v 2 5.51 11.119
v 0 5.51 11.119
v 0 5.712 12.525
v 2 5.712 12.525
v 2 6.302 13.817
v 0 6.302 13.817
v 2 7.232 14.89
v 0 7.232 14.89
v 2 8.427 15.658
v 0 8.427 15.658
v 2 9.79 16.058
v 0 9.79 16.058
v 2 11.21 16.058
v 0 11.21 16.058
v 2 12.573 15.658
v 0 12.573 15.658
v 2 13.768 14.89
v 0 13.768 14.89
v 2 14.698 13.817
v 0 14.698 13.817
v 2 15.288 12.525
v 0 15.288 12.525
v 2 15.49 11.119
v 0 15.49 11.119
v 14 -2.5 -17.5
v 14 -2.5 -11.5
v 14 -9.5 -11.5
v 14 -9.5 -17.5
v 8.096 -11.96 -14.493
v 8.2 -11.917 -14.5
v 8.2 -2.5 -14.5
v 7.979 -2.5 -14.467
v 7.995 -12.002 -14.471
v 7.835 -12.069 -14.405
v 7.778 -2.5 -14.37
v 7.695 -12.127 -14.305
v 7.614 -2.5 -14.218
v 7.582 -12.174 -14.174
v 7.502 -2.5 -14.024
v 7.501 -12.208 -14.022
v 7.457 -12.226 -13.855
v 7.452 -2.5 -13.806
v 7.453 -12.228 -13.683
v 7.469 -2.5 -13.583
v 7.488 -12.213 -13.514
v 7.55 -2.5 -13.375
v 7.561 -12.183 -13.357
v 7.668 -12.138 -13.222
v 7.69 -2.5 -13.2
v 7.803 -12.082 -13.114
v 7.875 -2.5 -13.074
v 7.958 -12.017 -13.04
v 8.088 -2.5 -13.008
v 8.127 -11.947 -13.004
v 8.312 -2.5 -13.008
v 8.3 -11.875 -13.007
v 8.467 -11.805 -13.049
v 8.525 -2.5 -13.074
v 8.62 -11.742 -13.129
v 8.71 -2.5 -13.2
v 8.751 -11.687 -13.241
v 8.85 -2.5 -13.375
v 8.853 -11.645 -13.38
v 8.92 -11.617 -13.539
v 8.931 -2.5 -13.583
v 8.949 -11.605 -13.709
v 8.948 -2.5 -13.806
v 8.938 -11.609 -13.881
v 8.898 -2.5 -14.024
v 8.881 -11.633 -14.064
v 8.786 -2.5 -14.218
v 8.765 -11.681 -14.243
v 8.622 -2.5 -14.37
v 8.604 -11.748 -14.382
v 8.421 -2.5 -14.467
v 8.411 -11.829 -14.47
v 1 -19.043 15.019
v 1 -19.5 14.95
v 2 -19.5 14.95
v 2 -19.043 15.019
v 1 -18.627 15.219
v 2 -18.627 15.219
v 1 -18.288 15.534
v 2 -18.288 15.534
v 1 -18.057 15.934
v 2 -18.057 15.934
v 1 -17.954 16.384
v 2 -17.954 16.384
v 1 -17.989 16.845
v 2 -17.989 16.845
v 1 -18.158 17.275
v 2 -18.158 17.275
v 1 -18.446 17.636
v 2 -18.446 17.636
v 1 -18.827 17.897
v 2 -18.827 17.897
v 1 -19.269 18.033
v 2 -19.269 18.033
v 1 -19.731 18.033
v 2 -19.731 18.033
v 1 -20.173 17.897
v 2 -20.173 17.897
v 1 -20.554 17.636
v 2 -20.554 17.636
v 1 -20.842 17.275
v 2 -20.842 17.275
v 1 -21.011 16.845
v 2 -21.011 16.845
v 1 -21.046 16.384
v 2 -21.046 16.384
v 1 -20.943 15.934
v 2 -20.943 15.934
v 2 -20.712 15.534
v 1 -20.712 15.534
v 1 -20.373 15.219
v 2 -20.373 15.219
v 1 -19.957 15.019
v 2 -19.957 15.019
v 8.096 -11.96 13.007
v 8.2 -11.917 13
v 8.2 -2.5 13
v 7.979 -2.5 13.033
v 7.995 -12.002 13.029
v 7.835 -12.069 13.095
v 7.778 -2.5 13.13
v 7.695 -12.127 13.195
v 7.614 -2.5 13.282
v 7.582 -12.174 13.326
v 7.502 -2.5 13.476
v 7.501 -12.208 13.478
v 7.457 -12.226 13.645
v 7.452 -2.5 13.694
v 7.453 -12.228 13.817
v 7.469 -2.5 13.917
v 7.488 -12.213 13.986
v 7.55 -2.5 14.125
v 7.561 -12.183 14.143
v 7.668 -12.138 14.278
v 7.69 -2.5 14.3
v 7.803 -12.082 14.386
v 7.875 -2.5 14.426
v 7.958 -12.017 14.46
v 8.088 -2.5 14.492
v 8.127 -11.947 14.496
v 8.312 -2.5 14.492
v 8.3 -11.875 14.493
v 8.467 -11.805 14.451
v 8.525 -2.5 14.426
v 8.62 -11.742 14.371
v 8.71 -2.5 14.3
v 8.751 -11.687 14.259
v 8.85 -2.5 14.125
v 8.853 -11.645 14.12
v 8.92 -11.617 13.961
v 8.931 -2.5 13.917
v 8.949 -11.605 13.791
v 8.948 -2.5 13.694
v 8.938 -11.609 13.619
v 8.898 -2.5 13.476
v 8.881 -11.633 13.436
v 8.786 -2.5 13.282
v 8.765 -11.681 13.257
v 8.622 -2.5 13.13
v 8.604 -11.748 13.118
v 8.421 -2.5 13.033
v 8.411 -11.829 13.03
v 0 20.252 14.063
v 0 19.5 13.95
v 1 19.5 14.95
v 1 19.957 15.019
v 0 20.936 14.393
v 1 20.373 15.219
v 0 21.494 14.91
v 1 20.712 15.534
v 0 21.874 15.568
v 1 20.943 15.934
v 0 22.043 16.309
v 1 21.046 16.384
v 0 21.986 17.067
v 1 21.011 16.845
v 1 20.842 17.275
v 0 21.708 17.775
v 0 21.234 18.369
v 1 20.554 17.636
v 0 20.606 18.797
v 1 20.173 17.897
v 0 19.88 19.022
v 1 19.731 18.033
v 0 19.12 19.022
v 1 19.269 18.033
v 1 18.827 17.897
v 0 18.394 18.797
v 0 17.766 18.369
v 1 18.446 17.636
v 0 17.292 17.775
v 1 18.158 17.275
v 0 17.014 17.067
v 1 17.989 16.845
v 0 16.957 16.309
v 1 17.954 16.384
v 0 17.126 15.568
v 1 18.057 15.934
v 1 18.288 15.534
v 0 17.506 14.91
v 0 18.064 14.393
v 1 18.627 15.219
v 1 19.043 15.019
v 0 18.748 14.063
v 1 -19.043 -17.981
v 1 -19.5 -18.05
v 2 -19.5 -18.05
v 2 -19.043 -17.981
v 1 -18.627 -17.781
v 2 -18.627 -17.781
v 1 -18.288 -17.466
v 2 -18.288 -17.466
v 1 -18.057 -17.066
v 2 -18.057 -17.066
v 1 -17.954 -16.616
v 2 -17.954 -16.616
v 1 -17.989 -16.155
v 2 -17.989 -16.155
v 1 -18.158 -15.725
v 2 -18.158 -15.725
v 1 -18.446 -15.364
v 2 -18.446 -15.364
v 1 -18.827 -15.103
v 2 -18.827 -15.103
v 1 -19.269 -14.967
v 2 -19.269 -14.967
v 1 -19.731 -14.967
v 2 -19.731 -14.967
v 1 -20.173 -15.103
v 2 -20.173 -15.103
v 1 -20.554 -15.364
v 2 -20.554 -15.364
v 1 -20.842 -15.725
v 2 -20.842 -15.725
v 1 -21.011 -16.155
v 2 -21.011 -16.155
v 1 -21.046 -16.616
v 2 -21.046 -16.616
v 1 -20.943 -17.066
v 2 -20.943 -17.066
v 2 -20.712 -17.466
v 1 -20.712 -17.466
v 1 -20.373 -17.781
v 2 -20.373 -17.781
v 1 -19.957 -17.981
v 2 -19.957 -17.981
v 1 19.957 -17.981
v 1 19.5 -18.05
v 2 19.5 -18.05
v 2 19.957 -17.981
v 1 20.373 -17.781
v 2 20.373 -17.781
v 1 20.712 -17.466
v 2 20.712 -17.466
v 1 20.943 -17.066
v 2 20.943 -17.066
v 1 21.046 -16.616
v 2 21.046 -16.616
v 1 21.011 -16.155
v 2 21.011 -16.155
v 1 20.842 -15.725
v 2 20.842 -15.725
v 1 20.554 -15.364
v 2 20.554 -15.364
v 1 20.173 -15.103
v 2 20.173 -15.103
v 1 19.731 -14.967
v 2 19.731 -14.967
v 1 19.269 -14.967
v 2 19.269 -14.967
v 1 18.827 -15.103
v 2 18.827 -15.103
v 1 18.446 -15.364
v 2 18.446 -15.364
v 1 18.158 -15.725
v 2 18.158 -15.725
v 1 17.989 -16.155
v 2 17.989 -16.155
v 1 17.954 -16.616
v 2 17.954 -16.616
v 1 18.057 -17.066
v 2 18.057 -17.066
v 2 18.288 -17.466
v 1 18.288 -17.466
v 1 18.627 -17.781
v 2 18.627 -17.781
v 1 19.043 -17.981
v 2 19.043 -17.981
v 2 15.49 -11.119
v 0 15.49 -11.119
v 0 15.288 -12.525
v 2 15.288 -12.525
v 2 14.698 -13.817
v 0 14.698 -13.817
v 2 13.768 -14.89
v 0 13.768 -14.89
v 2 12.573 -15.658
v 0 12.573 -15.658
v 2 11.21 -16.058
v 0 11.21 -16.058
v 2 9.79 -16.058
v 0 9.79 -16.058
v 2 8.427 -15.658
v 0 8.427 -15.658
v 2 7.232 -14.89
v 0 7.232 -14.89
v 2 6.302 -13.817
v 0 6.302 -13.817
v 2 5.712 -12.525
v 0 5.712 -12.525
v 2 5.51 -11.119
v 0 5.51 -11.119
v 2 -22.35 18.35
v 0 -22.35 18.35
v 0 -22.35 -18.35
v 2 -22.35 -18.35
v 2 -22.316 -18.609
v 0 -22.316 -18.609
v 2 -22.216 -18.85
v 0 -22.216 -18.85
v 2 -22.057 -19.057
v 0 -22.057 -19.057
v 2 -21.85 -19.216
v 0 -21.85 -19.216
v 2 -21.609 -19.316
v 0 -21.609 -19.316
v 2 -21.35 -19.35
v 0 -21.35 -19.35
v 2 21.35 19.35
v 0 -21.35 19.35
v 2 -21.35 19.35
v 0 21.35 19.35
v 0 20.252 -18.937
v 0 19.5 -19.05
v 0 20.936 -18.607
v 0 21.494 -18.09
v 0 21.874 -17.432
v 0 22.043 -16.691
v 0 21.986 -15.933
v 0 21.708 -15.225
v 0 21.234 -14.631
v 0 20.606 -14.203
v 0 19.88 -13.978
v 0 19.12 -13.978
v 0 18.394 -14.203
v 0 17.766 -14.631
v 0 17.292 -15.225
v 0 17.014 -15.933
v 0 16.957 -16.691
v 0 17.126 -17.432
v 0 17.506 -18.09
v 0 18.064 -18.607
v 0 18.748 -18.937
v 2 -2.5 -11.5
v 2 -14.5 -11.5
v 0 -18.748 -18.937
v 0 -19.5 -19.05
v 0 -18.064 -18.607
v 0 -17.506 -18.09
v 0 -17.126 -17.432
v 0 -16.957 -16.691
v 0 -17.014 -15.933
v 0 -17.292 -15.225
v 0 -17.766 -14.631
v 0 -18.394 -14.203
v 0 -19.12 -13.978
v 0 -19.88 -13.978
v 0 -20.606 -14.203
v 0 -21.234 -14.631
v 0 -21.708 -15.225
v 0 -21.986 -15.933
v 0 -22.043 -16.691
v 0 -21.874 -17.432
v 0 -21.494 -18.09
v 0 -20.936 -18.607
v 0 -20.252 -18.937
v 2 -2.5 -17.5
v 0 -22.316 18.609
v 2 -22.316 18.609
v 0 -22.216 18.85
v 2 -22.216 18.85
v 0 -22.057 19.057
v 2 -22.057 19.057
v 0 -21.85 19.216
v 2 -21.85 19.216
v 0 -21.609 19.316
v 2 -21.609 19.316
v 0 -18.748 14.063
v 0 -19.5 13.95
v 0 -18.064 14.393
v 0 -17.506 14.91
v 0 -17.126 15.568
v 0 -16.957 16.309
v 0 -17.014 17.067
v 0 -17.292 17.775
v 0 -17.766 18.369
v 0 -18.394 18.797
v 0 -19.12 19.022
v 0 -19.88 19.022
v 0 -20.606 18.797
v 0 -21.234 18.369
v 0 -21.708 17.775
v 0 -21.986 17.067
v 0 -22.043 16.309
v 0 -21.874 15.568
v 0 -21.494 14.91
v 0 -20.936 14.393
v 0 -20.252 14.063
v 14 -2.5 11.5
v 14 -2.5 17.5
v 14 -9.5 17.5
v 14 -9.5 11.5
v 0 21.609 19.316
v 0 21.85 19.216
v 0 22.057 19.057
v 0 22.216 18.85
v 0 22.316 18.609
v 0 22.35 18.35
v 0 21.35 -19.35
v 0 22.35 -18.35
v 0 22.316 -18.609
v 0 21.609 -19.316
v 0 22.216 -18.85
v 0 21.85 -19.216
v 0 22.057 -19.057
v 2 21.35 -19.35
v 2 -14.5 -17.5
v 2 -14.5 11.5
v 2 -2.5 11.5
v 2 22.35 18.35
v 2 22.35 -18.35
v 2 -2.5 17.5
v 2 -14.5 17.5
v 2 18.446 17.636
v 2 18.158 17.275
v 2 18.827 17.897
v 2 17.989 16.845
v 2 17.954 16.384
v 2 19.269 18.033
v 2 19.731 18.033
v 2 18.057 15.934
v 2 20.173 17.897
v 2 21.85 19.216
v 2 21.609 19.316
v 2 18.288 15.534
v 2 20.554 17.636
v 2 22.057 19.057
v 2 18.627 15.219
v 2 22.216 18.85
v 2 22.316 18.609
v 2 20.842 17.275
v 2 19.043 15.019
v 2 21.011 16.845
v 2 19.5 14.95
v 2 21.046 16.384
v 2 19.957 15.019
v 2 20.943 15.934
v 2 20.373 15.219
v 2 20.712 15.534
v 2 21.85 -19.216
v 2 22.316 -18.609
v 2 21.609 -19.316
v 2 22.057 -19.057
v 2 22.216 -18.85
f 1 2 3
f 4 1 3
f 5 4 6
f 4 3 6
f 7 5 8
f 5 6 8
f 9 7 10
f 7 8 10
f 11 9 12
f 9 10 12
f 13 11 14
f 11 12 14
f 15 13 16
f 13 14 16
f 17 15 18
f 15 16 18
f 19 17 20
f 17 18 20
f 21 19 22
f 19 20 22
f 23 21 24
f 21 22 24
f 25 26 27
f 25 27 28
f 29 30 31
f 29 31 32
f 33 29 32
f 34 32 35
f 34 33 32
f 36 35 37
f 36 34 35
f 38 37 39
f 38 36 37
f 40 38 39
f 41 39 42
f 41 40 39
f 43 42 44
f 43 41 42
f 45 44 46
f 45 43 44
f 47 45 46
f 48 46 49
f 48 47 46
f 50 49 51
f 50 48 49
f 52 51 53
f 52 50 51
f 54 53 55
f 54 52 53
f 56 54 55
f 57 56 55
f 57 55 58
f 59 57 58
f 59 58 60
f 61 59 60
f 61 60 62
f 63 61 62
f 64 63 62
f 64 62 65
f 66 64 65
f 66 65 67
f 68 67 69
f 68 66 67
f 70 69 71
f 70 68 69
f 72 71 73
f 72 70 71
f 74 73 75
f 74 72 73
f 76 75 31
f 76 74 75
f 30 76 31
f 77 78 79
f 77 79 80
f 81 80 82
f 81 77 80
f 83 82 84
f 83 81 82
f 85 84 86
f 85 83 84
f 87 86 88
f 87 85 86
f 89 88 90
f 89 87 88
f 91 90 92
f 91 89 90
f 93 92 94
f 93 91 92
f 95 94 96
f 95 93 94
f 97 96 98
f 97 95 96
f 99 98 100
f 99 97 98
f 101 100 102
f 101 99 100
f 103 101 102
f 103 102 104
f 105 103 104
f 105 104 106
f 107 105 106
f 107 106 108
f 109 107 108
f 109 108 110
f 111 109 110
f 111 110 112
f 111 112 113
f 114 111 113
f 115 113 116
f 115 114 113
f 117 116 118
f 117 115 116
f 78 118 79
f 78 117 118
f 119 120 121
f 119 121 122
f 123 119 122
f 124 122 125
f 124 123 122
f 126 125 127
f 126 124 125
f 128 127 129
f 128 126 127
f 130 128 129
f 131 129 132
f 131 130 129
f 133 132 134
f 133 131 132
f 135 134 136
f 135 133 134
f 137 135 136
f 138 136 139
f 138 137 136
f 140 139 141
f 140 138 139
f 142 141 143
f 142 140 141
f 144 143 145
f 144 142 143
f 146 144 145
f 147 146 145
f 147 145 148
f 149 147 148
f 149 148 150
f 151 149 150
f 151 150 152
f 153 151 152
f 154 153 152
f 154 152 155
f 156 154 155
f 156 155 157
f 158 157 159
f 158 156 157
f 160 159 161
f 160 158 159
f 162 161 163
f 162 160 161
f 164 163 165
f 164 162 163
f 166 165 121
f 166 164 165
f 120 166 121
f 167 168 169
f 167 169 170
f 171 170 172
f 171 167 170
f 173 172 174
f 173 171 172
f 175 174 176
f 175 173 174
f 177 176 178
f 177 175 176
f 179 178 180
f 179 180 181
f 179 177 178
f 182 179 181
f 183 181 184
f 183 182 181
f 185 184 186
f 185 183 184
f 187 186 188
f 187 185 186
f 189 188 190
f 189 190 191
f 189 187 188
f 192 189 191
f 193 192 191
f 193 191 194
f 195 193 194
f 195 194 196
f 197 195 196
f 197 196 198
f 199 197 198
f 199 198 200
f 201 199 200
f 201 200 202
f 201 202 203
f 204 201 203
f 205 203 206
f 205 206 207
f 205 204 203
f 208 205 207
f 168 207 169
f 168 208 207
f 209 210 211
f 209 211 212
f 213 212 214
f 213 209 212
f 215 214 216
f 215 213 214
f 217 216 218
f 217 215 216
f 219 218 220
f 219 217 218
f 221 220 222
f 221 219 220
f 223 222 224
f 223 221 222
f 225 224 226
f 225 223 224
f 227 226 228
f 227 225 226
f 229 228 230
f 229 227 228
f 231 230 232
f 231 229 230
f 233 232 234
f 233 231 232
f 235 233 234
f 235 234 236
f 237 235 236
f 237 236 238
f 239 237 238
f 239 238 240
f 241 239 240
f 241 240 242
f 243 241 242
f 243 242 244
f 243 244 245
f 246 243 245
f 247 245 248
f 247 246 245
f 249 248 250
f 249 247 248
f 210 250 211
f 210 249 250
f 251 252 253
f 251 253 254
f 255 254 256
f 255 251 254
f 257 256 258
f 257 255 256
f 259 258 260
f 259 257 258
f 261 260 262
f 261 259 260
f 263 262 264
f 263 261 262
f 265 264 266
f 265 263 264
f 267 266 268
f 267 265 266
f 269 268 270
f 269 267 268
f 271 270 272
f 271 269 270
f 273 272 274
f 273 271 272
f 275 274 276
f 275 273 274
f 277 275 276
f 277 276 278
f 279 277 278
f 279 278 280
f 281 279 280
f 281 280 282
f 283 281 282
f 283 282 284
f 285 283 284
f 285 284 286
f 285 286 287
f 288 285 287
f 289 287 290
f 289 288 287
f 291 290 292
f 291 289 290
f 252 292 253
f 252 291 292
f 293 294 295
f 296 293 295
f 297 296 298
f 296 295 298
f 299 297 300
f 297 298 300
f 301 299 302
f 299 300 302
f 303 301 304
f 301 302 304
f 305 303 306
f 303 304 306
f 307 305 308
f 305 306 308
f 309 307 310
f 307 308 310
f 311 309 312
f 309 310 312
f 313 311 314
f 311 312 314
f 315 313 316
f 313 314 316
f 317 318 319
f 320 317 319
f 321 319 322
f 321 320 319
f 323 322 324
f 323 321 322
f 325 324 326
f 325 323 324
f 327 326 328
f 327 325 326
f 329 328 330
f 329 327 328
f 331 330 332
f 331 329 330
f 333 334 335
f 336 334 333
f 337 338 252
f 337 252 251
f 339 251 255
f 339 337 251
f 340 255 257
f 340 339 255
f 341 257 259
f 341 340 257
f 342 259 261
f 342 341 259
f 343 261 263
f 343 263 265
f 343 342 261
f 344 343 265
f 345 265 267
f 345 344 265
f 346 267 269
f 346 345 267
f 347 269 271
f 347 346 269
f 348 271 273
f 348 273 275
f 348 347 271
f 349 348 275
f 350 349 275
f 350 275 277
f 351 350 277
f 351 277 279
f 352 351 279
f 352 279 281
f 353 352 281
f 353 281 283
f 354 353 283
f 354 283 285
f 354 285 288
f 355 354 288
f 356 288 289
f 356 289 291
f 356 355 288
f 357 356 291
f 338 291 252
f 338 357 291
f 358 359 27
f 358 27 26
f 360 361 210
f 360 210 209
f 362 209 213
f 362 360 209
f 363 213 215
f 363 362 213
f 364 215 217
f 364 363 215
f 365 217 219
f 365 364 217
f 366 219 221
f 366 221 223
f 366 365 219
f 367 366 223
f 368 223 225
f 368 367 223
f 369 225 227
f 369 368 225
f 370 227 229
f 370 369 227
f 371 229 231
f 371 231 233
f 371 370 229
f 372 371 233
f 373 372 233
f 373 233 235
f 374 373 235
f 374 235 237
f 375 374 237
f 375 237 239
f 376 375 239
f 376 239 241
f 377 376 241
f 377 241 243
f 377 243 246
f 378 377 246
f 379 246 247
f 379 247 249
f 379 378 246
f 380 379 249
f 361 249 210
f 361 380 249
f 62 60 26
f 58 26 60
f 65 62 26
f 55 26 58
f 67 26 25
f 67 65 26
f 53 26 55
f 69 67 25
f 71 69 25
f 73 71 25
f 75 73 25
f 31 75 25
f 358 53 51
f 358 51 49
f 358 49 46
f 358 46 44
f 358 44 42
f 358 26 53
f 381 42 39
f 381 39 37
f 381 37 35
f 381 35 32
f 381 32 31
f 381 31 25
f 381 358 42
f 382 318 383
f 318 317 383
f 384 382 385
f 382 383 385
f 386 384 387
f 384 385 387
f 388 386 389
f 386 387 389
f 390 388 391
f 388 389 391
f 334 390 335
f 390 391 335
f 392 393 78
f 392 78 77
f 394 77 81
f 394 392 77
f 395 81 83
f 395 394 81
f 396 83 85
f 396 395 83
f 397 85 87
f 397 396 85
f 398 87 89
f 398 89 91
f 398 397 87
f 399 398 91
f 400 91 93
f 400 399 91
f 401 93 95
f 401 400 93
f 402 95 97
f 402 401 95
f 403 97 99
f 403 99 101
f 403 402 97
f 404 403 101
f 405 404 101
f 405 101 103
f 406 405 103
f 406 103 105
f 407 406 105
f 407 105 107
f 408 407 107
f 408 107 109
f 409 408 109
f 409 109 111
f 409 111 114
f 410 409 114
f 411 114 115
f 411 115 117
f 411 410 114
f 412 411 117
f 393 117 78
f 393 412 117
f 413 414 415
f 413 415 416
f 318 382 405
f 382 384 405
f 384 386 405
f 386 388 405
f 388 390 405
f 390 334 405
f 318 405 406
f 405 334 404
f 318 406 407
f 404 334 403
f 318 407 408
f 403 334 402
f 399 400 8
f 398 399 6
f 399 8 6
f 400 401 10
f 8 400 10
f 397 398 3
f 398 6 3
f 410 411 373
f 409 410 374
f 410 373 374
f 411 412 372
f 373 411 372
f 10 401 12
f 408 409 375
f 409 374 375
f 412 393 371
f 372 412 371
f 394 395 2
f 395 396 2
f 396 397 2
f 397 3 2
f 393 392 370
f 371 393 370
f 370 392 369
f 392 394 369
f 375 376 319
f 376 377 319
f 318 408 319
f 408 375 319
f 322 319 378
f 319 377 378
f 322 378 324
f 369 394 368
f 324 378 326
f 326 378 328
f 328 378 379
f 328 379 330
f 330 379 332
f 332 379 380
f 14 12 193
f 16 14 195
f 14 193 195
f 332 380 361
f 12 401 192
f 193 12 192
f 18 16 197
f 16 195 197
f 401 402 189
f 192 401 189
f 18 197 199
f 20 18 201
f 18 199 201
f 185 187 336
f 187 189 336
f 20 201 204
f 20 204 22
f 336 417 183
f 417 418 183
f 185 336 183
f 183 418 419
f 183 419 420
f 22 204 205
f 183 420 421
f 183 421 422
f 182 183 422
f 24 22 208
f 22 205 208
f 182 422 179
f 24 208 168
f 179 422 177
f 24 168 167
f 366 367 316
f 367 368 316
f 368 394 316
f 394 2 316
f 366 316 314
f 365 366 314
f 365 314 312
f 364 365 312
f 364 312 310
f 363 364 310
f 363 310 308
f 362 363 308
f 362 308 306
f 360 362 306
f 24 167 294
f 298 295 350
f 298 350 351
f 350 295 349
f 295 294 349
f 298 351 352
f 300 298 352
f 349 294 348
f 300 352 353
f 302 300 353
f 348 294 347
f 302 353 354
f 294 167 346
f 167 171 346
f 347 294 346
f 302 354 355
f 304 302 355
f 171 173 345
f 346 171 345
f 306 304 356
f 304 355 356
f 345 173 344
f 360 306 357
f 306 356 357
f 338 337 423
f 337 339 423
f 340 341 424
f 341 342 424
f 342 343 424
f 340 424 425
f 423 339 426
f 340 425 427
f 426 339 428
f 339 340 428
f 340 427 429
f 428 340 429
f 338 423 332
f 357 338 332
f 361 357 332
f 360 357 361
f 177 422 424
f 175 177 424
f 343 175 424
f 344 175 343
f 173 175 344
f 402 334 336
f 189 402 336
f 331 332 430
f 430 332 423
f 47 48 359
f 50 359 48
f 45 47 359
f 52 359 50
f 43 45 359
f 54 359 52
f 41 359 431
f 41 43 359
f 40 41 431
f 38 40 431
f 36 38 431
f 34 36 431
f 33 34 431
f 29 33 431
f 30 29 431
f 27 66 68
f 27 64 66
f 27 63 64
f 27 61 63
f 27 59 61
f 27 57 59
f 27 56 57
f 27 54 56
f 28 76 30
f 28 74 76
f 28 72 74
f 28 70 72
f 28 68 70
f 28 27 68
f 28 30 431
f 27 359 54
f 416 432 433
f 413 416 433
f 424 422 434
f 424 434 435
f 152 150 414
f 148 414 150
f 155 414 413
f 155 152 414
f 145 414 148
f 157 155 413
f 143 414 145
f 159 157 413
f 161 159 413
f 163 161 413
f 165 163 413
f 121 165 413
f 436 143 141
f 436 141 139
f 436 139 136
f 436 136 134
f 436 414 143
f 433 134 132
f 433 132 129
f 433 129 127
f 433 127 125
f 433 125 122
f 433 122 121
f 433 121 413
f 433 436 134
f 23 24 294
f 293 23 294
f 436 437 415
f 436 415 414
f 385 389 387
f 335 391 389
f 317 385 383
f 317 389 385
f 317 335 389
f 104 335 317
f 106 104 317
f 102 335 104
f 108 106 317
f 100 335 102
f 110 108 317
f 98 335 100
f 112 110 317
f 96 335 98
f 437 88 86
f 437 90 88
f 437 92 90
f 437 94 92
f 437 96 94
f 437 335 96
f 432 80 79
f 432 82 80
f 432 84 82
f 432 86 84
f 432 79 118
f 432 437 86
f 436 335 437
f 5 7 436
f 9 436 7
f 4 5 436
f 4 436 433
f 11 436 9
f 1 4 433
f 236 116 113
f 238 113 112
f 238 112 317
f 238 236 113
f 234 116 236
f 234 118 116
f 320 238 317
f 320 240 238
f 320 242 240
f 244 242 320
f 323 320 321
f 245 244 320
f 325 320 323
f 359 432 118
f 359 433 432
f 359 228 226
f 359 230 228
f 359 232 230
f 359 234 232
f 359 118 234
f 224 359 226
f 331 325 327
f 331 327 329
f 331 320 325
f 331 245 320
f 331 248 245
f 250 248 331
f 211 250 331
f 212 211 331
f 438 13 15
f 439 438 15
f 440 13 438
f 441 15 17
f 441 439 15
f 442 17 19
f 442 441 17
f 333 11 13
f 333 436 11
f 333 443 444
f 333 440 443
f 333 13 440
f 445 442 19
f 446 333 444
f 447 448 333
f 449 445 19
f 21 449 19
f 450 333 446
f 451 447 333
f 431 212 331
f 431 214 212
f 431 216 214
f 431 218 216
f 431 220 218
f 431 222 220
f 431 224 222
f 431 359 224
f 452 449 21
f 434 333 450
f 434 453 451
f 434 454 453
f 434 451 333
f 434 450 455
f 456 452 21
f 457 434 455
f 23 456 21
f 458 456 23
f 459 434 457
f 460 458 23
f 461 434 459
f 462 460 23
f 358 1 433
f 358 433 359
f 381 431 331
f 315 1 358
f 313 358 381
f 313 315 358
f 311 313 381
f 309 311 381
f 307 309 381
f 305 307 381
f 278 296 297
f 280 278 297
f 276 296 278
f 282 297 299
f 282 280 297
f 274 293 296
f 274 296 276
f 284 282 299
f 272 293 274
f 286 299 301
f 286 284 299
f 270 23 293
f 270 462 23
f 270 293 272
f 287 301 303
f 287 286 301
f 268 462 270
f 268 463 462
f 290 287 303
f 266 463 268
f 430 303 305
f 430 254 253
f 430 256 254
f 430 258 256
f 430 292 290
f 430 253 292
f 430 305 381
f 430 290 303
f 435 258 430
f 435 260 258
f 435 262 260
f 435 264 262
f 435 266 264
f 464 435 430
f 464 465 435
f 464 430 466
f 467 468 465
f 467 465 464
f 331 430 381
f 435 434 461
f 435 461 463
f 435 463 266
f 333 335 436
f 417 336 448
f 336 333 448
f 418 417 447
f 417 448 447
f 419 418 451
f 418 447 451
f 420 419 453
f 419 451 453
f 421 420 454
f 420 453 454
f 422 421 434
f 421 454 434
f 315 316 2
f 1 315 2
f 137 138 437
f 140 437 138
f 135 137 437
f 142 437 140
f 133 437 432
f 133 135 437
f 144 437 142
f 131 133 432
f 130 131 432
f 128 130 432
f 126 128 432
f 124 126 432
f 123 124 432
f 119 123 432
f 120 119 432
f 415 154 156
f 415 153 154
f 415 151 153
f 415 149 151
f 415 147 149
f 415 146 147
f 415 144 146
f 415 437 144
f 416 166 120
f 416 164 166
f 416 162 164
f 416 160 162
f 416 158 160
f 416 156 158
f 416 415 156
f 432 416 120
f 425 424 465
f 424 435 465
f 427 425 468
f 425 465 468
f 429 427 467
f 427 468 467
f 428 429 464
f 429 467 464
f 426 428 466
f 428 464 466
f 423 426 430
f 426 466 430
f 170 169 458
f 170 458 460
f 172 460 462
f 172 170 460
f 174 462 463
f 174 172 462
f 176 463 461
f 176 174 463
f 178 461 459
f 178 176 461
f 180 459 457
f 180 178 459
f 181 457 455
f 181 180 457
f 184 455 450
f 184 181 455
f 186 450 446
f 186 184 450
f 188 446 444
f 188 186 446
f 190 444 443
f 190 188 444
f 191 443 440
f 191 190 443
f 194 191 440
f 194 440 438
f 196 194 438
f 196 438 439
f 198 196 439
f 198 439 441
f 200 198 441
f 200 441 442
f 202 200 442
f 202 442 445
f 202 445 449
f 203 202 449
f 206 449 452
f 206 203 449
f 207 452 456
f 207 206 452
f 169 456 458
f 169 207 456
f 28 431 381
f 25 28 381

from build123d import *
from OCP.BRepFilletAPI import BRepFilletAPI_MakeChamfer

# Parameters (mm, degrees)
SKETCH1_W               = 39
SKETCH1_H               = 45
SKETCH1_R               = 1.55
BOSS_EXTRUDE1_DEPTH     = 2
SKETCH2_W               = 6
SKETCH2_H               = 7
BOSS_EXTRUDE2_DEPTH     = 12
CHAMFER1_SIZE           = 5
CHAMFER1_SIZE_2         = 12
CUT_EXTRUDE1_DEPTH      = 12
CUT_EXTRUDE1_DEPTH_BACK = 22
SKETCH3_R               = 0.75
CUT_EXTRUDE2_DEPTH      = 33.101401839
CUT_EXTRUDE2_DEPTH_BACK = 33.101401839
SKETCH4_W               = 39
SKETCH4_H               = 45
SKETCH4_W_2             = 38.7
SKETCH4_H_2             = 44.7
FILLET1_R               = 1
CHAMFER2_SIZE           = 1


with BuildPart() as part:
    # Sketch1 → Boss-Extrude1 (new body)
    with BuildSketch(Plane(origin=(0, 0, 0), x_dir=(0, 0, -1), z_dir=(1, 0, 0))):
        Rectangle(SKETCH1_W, SKETCH1_H)
        with Locations((-16.5, 19.5)):
            Circle(SKETCH1_R, mode=Mode.SUBTRACT)
        with Locations((16.5, 19.5)):
            Circle(SKETCH1_R, mode=Mode.SUBTRACT)
        with Locations((16.5, -19.5)):
            Circle(SKETCH1_R, mode=Mode.SUBTRACT)
        with Locations((-16.5, -19.5)):
            Circle(SKETCH1_R, mode=Mode.SUBTRACT)
        with BuildLine():
            Line((-11.118955155, 15.489657916), (11.118955155, 15.489657916))
            ThreePointArc((11.118955155, 15.489657916), (16.108613071, 10.5), (11.118955155, 5.510342084))
            Line((11.118955155, 5.510342084), (-11.118955155, 5.510342084))
            ThreePointArc((-11.118955155, 5.510342084), (-16.108613071, 10.5), (-11.118955155, 15.489657916))
        make_face(mode=Mode.SUBTRACT)
    extrude(amount=BOSS_EXTRUDE1_DEPTH)

    # Sketch2 → Boss-Extrude2 (add)
    with BuildSketch(Plane(origin=(2, 0, 0), x_dir=(0, 0, -1), z_dir=(1, 0, 0))):
        with Locations((14.5, -6)):
            Rectangle(SKETCH2_W, SKETCH2_H)
        with Locations((-14.5, -6)):
            Rectangle(SKETCH2_W, SKETCH2_H)
    extrude(amount=BOSS_EXTRUDE2_DEPTH)

    # Chamfer1
    chamfer1_edges_1 = [part.edges().sort_by_distance(p)[0] for p in [
        (2, -9.5, -14.5),
    ]]
    chamfer1_side_1 = [part.faces().sort_by_distance(p)[0] for p in [
        (2, -9.6, -14.5),
    ]]
    chamfer1_edges_2 = [part.edges().sort_by_distance(p)[0] for p in [
        (2, -9.5, 14.5),
    ]]
    chamfer1_side_2 = [part.faces().sort_by_distance(p)[0] for p in [
        (2, -9.6, 14.5),
    ]]
    chamfer1 = BRepFilletAPI_MakeChamfer(part.part.solid().wrapped)
    for e in chamfer1_edges_1:
        chamfer1.Add(CHAMFER1_SIZE - 0.0001, CHAMFER1_SIZE_2 - 0.0001, e.wrapped, chamfer1_side_1[0].wrapped)
    for e in chamfer1_edges_2:
        chamfer1.Add(CHAMFER1_SIZE - 0.0001, CHAMFER1_SIZE_2 - 0.0001, e.wrapped, chamfer1_side_2[0].wrapped)
    add(Compound.cast(chamfer1.Shape()), mode=Mode.REPLACE)  # a hair under: the kernel refuses the full size

    # Sketch3 → Cut-Extrude1 (cut, two sides: drawn at the far end of the back side and taken through both)
    with BuildSketch(Plane(origin=(0, -2.5, 0), x_dir=(1, 0, 0), z_dir=(0, 1, 0)).offset(-CUT_EXTRUDE1_DEPTH_BACK)):
        with Locations(Location((8.2, -13.75, 0), (0, 0, 90))):
            Circle(SKETCH3_R)
        with Locations(Location((8.2, 13.75, 0), (0, 0, 90))):
            Circle(SKETCH3_R)
    extrude(amount=CUT_EXTRUDE1_DEPTH + CUT_EXTRUDE1_DEPTH_BACK, mode=Mode.SUBTRACT)

    # Sketch4 → Cut-Extrude2 (cut, two sides: drawn at the far end of the back side and taken through both)
    with BuildSketch(Plane(origin=(2, 0, 0), x_dir=(0, 0, -1), z_dir=(1, 0, 0)).offset(-CUT_EXTRUDE2_DEPTH_BACK)):
        Rectangle(SKETCH4_W, SKETCH4_H)
        Rectangle(SKETCH4_W_2, SKETCH4_H_2, mode=Mode.SUBTRACT)
    extrude(amount=CUT_EXTRUDE2_DEPTH + CUT_EXTRUDE2_DEPTH_BACK, mode=Mode.SUBTRACT)

    # Fillet1
    fillet1_edges = [part.edges().sort_by_distance(p)[0] for p in [
        (1, 22.35, -19.35),
        (1, -22.35, -19.35),
        (1, -22.35, 19.35),
        (1, 22.35, 19.35),
    ]]
    fillet(fillet1_edges, radius=FILLET1_R)

    # Chamfer2
    chamfer2_edges = [part.edges().sort_by_distance(p)[0] for p in [
        (0, 19.5, 18.05),
        (0, 19.5, -14.95),
        (0, -19.5, -14.95),
        (0, -19.5, 18.05),
    ]]
    chamfer(chamfer2_edges, length=CHAMFER2_SIZE)


solid = part.part
